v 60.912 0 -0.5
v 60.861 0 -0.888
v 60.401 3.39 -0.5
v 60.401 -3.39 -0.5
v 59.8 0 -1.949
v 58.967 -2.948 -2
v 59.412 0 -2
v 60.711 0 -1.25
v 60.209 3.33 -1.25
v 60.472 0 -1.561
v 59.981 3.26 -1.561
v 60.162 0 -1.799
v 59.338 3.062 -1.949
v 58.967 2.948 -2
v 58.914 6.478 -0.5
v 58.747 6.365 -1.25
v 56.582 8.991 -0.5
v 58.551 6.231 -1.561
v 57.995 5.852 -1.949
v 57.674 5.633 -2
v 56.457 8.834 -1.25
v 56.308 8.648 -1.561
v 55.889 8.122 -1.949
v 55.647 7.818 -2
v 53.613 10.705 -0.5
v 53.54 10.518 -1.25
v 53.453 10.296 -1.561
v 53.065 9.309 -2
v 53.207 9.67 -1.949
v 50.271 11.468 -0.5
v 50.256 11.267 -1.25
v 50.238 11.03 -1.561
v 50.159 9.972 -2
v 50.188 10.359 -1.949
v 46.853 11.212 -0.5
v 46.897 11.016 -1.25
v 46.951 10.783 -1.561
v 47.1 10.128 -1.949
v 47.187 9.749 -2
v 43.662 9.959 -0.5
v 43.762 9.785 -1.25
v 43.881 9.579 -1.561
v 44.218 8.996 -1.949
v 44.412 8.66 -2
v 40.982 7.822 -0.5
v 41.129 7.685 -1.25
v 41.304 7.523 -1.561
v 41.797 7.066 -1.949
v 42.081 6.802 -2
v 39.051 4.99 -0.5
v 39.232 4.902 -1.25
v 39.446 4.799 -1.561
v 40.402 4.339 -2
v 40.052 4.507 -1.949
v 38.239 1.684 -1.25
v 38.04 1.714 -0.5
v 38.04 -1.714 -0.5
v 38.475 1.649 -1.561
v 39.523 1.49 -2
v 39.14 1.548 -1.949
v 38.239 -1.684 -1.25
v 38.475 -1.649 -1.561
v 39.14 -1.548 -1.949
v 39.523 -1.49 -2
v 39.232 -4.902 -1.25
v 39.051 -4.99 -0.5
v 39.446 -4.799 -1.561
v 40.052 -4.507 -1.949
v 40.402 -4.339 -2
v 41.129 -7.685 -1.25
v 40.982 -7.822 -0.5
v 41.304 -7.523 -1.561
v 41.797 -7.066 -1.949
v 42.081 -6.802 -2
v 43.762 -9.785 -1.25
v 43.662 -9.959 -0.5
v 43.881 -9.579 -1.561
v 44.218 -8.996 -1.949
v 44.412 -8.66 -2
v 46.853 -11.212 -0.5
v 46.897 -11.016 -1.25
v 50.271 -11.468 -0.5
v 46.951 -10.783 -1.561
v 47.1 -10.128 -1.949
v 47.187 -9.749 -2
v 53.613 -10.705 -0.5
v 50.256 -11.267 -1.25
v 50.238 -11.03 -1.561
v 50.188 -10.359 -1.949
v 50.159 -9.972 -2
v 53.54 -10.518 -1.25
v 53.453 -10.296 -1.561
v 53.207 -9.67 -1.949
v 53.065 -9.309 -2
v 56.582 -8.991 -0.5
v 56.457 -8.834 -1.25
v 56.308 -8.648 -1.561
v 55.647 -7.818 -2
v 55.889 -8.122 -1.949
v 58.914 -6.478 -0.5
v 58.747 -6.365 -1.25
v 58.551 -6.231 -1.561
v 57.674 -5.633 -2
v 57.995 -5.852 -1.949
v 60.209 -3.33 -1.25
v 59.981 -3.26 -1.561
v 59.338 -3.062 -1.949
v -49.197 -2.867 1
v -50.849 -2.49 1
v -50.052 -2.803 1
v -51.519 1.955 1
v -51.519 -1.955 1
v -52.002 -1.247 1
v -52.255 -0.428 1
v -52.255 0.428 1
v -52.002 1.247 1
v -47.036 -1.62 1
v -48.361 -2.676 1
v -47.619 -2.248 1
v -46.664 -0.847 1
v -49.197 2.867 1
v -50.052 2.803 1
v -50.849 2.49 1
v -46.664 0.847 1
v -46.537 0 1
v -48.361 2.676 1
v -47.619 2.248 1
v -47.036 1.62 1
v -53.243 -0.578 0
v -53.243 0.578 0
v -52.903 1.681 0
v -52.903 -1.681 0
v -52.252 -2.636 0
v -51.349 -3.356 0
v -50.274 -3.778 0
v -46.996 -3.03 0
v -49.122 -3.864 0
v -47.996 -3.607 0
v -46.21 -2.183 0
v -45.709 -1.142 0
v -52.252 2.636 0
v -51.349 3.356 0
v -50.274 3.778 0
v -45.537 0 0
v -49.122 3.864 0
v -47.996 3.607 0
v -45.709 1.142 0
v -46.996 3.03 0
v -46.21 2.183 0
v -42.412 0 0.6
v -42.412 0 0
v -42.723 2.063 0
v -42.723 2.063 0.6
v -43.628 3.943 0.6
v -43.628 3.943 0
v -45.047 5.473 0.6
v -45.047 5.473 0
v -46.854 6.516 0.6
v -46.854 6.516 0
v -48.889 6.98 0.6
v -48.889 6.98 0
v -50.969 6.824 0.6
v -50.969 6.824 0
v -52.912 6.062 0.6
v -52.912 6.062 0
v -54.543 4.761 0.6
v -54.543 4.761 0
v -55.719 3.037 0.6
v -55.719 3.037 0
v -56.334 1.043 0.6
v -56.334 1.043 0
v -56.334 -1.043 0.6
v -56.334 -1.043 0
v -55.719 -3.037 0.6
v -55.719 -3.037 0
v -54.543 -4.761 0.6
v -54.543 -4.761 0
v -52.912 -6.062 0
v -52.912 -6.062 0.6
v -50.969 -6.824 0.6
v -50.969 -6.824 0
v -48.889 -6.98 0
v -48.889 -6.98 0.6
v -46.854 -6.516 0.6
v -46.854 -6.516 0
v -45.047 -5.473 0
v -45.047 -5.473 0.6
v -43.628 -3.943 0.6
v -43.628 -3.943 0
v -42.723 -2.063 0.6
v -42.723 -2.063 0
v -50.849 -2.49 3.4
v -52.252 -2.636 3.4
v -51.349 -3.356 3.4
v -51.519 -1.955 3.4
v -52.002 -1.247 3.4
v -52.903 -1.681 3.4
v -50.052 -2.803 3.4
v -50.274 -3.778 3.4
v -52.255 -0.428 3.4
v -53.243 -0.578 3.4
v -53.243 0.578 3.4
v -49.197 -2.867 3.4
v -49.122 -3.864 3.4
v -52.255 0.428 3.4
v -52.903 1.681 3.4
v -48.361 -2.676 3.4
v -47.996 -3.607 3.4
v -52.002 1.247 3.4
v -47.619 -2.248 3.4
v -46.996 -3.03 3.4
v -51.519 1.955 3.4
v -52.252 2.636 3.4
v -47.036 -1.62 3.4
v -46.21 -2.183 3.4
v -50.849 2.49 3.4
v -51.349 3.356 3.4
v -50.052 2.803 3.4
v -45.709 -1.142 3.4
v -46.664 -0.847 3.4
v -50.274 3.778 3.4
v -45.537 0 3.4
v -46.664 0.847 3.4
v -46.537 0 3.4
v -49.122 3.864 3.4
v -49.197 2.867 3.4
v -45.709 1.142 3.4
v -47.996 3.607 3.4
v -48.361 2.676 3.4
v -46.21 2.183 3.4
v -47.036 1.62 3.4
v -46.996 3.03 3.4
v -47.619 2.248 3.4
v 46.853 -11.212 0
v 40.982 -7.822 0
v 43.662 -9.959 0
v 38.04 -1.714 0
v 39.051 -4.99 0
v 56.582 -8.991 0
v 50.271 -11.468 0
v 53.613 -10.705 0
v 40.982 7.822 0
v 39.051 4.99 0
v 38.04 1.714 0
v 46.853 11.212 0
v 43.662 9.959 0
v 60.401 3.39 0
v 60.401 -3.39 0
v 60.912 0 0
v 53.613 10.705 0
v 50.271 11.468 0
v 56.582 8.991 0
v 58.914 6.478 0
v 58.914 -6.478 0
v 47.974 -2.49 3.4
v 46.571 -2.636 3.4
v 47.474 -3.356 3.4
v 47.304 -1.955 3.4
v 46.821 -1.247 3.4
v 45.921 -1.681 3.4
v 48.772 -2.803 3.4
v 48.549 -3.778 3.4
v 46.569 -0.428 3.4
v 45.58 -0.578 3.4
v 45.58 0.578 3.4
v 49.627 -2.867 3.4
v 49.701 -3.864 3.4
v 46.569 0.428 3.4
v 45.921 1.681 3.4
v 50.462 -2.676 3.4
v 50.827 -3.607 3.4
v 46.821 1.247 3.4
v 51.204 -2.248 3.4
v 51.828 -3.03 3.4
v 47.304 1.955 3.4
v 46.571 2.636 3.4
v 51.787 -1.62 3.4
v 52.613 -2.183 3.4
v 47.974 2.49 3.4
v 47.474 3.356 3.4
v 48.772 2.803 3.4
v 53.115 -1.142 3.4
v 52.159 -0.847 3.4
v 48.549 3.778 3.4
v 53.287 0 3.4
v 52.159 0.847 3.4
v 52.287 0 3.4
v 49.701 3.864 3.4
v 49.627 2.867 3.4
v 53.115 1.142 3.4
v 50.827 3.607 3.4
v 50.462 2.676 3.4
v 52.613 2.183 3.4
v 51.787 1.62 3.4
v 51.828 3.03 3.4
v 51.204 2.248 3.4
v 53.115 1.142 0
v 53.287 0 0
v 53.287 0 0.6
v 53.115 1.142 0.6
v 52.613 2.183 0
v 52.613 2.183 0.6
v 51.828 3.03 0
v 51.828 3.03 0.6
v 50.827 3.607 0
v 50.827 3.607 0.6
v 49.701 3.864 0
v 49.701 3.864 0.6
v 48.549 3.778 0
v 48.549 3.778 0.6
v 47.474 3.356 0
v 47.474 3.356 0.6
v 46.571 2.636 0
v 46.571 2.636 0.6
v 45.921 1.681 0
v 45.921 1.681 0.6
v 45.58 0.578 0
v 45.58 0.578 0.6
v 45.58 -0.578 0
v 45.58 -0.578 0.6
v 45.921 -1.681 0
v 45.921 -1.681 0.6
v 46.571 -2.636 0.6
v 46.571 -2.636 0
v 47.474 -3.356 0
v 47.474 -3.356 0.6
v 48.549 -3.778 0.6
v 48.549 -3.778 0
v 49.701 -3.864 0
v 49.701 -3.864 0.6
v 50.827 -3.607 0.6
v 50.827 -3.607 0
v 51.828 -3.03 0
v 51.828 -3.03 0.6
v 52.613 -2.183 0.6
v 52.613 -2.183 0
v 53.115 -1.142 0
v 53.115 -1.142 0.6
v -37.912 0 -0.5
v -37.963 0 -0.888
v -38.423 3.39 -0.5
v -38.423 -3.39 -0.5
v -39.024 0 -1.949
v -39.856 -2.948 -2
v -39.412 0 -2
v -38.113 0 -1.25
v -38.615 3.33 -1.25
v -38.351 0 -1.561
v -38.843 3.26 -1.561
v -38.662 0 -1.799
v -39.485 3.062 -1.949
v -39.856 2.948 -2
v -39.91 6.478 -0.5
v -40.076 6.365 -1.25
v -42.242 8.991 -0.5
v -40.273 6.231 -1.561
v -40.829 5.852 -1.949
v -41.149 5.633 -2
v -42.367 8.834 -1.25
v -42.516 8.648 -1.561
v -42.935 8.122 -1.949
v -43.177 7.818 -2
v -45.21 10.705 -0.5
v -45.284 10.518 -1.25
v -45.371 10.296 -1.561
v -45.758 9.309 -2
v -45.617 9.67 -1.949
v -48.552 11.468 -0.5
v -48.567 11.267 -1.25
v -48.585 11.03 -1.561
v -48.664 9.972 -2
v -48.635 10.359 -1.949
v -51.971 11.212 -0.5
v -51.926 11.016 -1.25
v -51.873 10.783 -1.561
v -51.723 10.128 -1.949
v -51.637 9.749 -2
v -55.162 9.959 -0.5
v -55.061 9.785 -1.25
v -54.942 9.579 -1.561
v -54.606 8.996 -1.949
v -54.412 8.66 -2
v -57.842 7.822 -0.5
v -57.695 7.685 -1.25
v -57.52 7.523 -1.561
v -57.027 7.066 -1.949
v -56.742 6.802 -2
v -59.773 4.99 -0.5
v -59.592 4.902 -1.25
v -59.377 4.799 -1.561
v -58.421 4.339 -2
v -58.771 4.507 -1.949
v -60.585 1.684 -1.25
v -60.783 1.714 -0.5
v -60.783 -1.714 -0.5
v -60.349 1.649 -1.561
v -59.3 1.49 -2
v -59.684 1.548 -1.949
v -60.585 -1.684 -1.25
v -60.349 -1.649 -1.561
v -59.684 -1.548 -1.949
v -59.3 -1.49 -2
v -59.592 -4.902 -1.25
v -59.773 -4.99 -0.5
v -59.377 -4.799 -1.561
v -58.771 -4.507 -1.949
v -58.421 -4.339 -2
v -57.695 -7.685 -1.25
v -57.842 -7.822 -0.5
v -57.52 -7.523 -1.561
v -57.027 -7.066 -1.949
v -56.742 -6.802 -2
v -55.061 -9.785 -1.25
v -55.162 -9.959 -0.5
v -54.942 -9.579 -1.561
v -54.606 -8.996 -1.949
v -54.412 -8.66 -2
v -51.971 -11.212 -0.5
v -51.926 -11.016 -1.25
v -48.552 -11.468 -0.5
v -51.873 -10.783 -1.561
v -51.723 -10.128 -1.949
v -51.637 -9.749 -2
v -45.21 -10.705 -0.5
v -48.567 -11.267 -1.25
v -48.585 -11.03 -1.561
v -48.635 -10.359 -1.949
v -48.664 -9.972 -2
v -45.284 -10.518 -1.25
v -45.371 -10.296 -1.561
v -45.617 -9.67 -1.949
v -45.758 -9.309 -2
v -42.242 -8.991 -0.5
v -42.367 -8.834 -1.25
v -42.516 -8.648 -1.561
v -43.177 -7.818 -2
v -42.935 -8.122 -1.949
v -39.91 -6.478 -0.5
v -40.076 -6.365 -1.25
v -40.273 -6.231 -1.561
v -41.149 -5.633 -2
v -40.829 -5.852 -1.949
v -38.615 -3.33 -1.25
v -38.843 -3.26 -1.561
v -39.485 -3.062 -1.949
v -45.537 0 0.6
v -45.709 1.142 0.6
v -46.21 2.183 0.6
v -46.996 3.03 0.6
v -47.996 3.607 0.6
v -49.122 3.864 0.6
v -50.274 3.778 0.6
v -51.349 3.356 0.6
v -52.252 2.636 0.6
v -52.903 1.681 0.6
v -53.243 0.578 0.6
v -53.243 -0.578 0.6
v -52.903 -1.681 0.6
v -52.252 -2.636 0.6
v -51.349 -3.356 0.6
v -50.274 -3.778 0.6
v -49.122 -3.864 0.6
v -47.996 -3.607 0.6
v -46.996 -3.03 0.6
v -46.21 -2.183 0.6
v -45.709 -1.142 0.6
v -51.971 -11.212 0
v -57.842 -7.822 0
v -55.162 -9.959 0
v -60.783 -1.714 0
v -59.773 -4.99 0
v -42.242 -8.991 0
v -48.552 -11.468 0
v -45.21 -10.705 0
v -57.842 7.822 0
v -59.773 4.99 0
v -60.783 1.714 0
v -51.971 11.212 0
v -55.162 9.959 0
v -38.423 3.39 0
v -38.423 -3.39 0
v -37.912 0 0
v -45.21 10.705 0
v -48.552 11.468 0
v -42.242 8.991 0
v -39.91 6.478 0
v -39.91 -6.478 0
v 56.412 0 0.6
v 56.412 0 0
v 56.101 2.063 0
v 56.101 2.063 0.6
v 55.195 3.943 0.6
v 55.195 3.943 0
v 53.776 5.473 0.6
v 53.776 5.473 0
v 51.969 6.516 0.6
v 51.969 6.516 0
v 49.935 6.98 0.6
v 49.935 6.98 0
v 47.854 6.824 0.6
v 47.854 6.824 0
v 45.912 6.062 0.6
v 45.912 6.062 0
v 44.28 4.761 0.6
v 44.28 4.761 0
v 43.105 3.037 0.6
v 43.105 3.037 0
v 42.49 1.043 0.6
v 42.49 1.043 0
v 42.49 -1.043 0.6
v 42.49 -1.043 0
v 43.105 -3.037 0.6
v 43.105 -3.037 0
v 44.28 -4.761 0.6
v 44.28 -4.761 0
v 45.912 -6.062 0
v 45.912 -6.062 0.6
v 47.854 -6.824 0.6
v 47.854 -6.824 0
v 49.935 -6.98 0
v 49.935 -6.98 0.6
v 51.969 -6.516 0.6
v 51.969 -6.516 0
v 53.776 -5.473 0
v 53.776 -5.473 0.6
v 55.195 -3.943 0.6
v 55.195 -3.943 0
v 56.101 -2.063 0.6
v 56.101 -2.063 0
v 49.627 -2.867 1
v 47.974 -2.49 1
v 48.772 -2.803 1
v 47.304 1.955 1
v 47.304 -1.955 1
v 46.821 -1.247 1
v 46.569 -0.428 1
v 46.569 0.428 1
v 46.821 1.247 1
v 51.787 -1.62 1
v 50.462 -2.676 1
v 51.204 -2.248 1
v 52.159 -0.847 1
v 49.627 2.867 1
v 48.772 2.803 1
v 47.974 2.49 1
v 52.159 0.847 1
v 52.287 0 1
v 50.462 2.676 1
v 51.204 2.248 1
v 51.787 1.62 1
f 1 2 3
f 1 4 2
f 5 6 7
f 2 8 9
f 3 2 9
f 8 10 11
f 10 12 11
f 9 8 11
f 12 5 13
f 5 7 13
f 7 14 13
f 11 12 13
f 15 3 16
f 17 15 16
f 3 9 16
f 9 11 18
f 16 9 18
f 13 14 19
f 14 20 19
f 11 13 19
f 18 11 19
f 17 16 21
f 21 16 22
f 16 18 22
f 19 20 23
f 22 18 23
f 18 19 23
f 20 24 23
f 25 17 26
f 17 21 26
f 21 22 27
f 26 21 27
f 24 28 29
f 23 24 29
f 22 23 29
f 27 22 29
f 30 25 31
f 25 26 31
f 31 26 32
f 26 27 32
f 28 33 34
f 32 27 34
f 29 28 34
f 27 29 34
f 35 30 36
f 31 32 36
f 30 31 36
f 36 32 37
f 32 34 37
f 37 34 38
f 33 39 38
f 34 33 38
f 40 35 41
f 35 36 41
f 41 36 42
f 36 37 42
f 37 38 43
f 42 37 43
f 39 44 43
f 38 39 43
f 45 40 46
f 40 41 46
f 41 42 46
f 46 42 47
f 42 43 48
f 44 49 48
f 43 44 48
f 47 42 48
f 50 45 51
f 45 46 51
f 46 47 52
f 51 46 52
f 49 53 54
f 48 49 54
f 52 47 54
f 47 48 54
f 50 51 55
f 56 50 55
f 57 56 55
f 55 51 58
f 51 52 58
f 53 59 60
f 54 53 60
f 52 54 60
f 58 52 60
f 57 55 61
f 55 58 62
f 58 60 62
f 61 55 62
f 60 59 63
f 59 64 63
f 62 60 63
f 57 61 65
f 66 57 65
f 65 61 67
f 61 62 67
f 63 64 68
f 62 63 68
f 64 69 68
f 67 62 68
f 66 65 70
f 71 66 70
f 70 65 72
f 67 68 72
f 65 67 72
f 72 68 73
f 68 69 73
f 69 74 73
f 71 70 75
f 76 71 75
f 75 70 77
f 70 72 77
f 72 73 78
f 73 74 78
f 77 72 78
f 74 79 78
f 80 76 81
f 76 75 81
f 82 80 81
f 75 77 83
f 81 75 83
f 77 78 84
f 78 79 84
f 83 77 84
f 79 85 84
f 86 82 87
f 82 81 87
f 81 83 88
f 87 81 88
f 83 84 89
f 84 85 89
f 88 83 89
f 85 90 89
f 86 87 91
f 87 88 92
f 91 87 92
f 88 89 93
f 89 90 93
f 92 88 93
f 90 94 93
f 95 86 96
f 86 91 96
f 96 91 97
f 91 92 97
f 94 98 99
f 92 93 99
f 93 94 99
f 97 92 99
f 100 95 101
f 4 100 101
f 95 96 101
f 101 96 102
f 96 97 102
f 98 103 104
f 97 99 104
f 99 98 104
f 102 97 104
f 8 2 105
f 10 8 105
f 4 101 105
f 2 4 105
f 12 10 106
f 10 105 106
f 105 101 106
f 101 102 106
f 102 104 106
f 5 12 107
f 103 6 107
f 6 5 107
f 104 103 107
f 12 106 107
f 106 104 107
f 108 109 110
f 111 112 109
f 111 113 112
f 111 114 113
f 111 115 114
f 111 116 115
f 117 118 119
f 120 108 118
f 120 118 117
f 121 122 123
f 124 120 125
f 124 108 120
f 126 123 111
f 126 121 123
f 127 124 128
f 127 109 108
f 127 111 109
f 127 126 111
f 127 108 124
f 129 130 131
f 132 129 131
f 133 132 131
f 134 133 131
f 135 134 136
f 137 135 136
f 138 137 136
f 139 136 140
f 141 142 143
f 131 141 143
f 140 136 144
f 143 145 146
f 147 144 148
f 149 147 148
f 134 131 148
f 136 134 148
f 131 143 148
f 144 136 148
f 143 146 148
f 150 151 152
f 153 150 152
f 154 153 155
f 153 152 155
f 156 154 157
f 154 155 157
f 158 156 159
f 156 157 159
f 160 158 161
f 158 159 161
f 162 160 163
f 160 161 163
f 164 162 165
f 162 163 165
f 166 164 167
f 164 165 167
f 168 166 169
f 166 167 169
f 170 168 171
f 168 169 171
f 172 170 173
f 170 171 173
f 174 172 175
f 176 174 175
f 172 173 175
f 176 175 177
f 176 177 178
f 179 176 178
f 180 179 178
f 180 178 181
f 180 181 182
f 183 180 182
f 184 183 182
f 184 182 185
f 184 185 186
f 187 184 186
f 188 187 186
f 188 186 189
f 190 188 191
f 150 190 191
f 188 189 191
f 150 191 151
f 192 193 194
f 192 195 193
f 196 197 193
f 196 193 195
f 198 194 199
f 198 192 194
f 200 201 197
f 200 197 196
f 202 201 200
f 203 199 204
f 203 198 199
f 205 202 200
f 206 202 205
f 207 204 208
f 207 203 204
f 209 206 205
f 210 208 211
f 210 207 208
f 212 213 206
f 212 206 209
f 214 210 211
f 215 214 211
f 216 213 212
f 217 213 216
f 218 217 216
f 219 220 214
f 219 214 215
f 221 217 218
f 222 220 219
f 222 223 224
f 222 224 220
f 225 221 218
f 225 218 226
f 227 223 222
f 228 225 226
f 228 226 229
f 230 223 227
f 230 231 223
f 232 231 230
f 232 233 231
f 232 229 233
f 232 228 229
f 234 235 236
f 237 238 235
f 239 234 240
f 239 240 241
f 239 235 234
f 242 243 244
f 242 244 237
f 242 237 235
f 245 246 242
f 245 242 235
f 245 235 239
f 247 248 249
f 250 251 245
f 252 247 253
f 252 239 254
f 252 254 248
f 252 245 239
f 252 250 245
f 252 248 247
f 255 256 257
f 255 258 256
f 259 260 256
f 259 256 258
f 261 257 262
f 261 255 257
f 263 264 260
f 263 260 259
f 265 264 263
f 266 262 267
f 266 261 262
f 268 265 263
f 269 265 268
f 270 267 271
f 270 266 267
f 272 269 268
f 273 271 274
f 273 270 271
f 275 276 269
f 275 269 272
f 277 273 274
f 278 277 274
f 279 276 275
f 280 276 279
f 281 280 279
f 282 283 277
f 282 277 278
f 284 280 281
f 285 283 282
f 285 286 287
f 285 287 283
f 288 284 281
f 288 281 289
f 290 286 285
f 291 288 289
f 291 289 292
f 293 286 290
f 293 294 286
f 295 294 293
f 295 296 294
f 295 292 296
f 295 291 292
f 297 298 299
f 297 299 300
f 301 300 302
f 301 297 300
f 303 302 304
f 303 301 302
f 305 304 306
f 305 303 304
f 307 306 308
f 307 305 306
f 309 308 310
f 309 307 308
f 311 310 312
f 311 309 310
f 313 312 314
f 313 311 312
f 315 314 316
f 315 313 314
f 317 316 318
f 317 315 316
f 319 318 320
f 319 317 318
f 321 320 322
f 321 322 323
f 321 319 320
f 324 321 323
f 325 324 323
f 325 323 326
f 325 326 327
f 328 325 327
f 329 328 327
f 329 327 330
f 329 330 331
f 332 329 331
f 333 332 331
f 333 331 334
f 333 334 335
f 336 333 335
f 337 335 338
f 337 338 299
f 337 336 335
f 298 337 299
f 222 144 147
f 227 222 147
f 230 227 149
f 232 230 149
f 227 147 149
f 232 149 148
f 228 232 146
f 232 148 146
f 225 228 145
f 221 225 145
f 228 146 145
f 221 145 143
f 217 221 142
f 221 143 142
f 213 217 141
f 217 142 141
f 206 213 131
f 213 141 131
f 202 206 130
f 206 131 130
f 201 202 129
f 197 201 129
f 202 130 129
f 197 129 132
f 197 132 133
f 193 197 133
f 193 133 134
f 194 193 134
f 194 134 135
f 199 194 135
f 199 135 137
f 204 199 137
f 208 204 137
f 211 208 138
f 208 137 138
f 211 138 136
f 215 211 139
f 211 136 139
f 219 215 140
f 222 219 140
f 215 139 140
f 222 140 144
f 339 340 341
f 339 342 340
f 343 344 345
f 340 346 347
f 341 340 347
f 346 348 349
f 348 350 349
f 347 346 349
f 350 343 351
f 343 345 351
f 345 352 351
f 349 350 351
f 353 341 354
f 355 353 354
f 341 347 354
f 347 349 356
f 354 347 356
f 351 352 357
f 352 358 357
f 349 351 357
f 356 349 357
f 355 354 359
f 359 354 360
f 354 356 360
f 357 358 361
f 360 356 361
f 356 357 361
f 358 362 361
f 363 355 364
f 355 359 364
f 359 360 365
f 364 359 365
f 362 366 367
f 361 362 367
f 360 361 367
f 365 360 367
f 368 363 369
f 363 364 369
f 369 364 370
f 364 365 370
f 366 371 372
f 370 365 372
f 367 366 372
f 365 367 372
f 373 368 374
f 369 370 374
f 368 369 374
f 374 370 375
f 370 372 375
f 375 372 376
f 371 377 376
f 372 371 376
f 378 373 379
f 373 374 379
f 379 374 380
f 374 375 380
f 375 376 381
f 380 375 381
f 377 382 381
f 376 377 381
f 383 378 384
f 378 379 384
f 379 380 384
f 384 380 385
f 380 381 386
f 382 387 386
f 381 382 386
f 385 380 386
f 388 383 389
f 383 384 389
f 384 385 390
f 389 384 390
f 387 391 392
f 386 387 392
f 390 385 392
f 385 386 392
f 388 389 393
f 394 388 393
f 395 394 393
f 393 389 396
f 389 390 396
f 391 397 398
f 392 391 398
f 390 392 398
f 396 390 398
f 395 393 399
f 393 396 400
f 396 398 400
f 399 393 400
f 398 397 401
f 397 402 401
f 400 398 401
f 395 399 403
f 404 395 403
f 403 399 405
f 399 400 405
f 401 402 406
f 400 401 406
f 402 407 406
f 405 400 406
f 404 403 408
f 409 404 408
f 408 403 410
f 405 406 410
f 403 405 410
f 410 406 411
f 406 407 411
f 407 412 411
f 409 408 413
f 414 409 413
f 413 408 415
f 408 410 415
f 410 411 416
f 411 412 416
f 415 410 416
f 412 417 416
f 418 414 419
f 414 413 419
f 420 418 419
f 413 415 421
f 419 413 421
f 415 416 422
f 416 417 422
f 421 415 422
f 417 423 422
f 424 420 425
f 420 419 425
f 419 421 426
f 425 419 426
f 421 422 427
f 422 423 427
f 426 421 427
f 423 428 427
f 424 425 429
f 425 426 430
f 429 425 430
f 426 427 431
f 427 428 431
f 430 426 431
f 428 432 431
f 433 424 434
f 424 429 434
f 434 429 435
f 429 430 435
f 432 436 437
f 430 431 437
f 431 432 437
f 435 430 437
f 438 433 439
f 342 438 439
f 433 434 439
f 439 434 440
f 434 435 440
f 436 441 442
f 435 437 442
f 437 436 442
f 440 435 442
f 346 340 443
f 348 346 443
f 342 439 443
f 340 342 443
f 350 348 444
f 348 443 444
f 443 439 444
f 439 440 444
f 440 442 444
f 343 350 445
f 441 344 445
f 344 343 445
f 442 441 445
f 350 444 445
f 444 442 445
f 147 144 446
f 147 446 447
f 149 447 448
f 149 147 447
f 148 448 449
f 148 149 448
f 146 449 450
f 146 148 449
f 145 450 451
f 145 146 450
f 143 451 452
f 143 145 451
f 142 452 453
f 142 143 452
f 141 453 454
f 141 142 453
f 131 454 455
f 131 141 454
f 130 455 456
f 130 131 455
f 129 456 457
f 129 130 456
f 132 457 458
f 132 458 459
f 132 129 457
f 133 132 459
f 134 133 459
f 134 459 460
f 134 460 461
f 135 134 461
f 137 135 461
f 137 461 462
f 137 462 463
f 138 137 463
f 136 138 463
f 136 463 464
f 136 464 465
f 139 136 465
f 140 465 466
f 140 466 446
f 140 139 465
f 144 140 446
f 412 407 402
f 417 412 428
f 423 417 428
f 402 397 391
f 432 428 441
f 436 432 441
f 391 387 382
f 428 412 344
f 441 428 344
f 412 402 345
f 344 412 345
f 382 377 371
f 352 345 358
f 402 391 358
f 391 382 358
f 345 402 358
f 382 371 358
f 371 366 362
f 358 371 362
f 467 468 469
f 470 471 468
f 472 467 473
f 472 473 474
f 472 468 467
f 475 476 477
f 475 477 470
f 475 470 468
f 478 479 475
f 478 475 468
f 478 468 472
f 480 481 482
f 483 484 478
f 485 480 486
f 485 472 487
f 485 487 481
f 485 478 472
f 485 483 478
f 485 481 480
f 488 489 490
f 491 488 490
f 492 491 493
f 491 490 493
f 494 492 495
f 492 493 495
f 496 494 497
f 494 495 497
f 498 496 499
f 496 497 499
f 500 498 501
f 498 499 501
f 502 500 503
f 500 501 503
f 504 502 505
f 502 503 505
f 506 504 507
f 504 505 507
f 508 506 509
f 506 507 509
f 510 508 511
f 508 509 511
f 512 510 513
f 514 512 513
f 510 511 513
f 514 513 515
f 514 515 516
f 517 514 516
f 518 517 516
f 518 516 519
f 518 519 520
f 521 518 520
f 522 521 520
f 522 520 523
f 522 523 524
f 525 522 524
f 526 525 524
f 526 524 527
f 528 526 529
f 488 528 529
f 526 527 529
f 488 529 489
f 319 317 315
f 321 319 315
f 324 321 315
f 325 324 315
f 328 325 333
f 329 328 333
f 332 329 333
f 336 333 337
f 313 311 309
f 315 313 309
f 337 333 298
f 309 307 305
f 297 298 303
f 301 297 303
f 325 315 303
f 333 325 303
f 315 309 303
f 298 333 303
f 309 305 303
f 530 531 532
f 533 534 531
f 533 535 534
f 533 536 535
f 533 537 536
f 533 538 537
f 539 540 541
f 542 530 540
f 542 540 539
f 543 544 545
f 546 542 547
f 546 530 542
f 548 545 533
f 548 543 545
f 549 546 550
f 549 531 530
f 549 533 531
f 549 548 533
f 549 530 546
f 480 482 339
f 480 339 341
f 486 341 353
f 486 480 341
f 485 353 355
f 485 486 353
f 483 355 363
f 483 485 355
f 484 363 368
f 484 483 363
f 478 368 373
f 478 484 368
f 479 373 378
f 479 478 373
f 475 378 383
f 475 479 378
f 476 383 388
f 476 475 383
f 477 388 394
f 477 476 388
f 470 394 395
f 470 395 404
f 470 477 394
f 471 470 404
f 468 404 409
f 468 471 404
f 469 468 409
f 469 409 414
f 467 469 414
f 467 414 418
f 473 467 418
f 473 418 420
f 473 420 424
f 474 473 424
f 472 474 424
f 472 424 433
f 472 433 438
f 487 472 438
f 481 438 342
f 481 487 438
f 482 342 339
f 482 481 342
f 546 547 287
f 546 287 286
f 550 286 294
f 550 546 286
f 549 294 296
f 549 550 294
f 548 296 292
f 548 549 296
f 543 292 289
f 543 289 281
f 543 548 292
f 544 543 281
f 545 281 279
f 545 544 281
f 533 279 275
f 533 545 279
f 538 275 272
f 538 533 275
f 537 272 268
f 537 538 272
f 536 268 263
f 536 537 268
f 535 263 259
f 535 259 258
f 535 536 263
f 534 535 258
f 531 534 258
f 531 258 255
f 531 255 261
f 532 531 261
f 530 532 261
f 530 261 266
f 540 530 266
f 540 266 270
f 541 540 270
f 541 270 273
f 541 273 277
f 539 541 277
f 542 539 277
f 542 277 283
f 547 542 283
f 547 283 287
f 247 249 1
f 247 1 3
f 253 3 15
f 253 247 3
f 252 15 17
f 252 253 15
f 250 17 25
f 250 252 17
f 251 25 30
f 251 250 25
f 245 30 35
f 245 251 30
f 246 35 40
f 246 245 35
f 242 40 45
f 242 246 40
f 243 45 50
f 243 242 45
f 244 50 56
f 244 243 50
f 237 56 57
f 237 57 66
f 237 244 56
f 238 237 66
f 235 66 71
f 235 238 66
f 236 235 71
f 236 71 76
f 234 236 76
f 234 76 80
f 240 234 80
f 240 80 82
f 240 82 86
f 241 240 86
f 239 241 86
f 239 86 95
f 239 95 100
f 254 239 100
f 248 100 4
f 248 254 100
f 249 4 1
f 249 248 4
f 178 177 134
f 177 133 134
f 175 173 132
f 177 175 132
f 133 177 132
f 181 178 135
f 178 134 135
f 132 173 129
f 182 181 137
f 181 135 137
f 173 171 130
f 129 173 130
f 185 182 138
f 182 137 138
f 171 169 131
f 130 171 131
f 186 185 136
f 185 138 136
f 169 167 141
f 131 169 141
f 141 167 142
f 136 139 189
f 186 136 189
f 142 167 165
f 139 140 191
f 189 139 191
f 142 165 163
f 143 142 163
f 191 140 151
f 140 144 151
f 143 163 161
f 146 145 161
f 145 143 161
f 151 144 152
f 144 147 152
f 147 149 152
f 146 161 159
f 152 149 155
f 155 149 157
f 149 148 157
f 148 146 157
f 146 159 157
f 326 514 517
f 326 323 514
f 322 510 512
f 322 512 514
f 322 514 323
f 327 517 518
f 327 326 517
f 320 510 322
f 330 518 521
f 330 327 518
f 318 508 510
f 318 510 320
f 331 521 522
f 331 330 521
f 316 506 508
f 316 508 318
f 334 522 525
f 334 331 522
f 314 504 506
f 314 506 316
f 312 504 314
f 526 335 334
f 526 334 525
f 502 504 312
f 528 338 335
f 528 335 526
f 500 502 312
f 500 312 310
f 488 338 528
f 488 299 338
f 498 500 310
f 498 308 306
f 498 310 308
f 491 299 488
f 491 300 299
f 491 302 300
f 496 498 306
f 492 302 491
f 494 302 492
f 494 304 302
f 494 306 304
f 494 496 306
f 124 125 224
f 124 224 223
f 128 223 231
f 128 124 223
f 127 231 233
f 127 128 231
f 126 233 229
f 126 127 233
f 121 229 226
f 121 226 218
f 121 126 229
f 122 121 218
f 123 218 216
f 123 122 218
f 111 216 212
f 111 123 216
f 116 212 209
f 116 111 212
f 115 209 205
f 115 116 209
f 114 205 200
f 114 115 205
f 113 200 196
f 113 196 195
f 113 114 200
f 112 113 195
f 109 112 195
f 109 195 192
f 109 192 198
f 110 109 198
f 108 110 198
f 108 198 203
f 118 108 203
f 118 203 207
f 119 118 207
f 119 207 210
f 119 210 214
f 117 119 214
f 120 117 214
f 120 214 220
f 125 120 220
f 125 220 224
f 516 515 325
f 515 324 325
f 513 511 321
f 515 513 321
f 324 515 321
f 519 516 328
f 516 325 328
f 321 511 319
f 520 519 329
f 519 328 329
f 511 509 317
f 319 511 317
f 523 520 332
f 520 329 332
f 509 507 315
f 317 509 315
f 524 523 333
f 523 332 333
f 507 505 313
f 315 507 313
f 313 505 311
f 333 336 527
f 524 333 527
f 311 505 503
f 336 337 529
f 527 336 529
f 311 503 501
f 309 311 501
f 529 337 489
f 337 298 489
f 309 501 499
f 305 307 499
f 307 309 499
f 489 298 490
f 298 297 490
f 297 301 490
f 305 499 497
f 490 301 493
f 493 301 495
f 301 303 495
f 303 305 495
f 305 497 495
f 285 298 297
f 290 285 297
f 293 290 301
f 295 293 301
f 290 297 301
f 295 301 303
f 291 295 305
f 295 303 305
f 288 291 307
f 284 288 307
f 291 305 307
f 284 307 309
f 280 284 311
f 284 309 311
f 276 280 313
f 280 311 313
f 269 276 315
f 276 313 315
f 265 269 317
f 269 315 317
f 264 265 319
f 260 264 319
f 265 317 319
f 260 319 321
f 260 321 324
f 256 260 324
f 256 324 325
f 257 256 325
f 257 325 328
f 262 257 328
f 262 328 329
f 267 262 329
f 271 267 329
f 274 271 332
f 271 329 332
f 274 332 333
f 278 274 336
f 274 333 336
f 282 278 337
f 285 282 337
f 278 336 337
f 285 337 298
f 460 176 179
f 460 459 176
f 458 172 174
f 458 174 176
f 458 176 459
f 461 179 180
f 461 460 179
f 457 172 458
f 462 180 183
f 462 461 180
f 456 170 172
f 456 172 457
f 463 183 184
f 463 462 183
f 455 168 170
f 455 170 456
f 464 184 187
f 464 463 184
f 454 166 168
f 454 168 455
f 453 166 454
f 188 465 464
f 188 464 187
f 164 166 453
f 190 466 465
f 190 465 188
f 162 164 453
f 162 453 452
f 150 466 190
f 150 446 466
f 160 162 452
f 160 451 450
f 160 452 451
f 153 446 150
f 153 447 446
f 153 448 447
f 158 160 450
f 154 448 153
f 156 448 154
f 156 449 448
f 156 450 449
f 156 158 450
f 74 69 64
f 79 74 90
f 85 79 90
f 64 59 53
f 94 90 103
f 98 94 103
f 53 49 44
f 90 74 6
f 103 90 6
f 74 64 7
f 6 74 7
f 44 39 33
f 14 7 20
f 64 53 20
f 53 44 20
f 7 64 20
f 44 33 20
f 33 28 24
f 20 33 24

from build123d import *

# Parameters (mm, degrees)
F0_R     = 3.875
F1_DEPTH = 3.4
F0_R_2   = 7
F2_DEPTH = 0.6
F0_R_3   = 11.5
F3_DEPTH = 2
F4_T     = -1
F4_2_T   = -1
F5_R     = 1.5
F5_2_R   = 1.5


with BuildPart() as f1:
    # F0 (on Top) → F1 (new body)
    with BuildSketch(Plane.XY):
        with Locations((-49.4117662311, 0)):
            Circle(F0_R)
    extrude(amount=F1_DEPTH)

    # F4
    f4_openings = [f1.faces().sort_by_distance(p)[0] for p in [
        (-49.411766, 0, 3.4),
    ]]
    offset(amount=F4_T, openings=f4_openings)


with BuildPart() as f1b:
    # F0 (on Top) → F1, piece 2 (new body)
    with BuildSketch(Plane.XY):
        with Locations((49.4117662311, 0)):
            Circle(F0_R)
    extrude(amount=F1_DEPTH)

    # F4#2
    f4_2_openings = [f1b.faces().sort_by_distance(p)[0] for p in [
        (49.411766, 0, 3.4),
    ]]
    offset(amount=F4_2_T, openings=f4_2_openings)


with BuildPart() as f2:
    # F0 (on Top) → F2 (new body)
    with BuildSketch(Plane.XY):
        with Locations((-49.4117662311, 0)):
            Circle(F0_R_2)
        with Locations((-49.4117662311, 0)):
            Circle(F0_R, mode=Mode.SUBTRACT)
    extrude(amount=F2_DEPTH)


with BuildPart() as f2b:
    # F0 (on Top) → F2, piece 2 (new body)
    with BuildSketch(Plane.XY):
        with Locations((49.4117662311, 0)):
            Circle(F0_R_2)
        with Locations((49.4117662311, 0)):
            Circle(F0_R, mode=Mode.SUBTRACT)
    extrude(amount=F2_DEPTH)


with BuildPart() as f3:
    # F0 (on Top) → F3 (new body)
    with BuildSketch(Plane.XY):
        with Locations((-49.4117662311, 0)):
            Circle(F0_R_3)
        with Locations((-49.4117662311, 0)):
            Circle(F0_R_2, mode=Mode.SUBTRACT)
        with Locations((-49.4117662311, 0)):
            Circle(F0_R_2)
        with Locations((-49.4117662311, 0)):
            Circle(F0_R, mode=Mode.SUBTRACT)
        with Locations((-49.4117662311, 0)):
            Circle(F0_R)
    extrude(amount=-F3_DEPTH)

    # F5#2
    f5_2_edges = [f3.edges().sort_by_distance(p)[0] for p in [
        (-60.911766, 0, -2),
    ]]
    fillet(f5_2_edges, radius=F5_2_R)


with BuildPart() as f3b:
    # F0 (on Top) → F3, piece 2 (new body)
    with BuildSketch(Plane.XY):
        with Locations((49.4117662311, 0)):
            Circle(F0_R_3)
        with Locations((49.4117662311, 0)):
            Circle(F0_R_2, mode=Mode.SUBTRACT)
        with Locations((49.4117662311, 0)):
            Circle(F0_R_2)
        with Locations((49.4117662311, 0)):
            Circle(F0_R, mode=Mode.SUBTRACT)
        with Locations((49.4117662311, 0)):
            Circle(F0_R)
    extrude(amount=-F3_DEPTH)

    # F5
    f5_edges = [f3b.edges().sort_by_distance(p)[0] for p in [
        (37.911766, 0, -2),
    ]]
    fillet(f5_edges, radius=F5_R)


solid = Compound([f1.part, f1b.part, f2.part, f2b.part, f3.part, f3b.part])
